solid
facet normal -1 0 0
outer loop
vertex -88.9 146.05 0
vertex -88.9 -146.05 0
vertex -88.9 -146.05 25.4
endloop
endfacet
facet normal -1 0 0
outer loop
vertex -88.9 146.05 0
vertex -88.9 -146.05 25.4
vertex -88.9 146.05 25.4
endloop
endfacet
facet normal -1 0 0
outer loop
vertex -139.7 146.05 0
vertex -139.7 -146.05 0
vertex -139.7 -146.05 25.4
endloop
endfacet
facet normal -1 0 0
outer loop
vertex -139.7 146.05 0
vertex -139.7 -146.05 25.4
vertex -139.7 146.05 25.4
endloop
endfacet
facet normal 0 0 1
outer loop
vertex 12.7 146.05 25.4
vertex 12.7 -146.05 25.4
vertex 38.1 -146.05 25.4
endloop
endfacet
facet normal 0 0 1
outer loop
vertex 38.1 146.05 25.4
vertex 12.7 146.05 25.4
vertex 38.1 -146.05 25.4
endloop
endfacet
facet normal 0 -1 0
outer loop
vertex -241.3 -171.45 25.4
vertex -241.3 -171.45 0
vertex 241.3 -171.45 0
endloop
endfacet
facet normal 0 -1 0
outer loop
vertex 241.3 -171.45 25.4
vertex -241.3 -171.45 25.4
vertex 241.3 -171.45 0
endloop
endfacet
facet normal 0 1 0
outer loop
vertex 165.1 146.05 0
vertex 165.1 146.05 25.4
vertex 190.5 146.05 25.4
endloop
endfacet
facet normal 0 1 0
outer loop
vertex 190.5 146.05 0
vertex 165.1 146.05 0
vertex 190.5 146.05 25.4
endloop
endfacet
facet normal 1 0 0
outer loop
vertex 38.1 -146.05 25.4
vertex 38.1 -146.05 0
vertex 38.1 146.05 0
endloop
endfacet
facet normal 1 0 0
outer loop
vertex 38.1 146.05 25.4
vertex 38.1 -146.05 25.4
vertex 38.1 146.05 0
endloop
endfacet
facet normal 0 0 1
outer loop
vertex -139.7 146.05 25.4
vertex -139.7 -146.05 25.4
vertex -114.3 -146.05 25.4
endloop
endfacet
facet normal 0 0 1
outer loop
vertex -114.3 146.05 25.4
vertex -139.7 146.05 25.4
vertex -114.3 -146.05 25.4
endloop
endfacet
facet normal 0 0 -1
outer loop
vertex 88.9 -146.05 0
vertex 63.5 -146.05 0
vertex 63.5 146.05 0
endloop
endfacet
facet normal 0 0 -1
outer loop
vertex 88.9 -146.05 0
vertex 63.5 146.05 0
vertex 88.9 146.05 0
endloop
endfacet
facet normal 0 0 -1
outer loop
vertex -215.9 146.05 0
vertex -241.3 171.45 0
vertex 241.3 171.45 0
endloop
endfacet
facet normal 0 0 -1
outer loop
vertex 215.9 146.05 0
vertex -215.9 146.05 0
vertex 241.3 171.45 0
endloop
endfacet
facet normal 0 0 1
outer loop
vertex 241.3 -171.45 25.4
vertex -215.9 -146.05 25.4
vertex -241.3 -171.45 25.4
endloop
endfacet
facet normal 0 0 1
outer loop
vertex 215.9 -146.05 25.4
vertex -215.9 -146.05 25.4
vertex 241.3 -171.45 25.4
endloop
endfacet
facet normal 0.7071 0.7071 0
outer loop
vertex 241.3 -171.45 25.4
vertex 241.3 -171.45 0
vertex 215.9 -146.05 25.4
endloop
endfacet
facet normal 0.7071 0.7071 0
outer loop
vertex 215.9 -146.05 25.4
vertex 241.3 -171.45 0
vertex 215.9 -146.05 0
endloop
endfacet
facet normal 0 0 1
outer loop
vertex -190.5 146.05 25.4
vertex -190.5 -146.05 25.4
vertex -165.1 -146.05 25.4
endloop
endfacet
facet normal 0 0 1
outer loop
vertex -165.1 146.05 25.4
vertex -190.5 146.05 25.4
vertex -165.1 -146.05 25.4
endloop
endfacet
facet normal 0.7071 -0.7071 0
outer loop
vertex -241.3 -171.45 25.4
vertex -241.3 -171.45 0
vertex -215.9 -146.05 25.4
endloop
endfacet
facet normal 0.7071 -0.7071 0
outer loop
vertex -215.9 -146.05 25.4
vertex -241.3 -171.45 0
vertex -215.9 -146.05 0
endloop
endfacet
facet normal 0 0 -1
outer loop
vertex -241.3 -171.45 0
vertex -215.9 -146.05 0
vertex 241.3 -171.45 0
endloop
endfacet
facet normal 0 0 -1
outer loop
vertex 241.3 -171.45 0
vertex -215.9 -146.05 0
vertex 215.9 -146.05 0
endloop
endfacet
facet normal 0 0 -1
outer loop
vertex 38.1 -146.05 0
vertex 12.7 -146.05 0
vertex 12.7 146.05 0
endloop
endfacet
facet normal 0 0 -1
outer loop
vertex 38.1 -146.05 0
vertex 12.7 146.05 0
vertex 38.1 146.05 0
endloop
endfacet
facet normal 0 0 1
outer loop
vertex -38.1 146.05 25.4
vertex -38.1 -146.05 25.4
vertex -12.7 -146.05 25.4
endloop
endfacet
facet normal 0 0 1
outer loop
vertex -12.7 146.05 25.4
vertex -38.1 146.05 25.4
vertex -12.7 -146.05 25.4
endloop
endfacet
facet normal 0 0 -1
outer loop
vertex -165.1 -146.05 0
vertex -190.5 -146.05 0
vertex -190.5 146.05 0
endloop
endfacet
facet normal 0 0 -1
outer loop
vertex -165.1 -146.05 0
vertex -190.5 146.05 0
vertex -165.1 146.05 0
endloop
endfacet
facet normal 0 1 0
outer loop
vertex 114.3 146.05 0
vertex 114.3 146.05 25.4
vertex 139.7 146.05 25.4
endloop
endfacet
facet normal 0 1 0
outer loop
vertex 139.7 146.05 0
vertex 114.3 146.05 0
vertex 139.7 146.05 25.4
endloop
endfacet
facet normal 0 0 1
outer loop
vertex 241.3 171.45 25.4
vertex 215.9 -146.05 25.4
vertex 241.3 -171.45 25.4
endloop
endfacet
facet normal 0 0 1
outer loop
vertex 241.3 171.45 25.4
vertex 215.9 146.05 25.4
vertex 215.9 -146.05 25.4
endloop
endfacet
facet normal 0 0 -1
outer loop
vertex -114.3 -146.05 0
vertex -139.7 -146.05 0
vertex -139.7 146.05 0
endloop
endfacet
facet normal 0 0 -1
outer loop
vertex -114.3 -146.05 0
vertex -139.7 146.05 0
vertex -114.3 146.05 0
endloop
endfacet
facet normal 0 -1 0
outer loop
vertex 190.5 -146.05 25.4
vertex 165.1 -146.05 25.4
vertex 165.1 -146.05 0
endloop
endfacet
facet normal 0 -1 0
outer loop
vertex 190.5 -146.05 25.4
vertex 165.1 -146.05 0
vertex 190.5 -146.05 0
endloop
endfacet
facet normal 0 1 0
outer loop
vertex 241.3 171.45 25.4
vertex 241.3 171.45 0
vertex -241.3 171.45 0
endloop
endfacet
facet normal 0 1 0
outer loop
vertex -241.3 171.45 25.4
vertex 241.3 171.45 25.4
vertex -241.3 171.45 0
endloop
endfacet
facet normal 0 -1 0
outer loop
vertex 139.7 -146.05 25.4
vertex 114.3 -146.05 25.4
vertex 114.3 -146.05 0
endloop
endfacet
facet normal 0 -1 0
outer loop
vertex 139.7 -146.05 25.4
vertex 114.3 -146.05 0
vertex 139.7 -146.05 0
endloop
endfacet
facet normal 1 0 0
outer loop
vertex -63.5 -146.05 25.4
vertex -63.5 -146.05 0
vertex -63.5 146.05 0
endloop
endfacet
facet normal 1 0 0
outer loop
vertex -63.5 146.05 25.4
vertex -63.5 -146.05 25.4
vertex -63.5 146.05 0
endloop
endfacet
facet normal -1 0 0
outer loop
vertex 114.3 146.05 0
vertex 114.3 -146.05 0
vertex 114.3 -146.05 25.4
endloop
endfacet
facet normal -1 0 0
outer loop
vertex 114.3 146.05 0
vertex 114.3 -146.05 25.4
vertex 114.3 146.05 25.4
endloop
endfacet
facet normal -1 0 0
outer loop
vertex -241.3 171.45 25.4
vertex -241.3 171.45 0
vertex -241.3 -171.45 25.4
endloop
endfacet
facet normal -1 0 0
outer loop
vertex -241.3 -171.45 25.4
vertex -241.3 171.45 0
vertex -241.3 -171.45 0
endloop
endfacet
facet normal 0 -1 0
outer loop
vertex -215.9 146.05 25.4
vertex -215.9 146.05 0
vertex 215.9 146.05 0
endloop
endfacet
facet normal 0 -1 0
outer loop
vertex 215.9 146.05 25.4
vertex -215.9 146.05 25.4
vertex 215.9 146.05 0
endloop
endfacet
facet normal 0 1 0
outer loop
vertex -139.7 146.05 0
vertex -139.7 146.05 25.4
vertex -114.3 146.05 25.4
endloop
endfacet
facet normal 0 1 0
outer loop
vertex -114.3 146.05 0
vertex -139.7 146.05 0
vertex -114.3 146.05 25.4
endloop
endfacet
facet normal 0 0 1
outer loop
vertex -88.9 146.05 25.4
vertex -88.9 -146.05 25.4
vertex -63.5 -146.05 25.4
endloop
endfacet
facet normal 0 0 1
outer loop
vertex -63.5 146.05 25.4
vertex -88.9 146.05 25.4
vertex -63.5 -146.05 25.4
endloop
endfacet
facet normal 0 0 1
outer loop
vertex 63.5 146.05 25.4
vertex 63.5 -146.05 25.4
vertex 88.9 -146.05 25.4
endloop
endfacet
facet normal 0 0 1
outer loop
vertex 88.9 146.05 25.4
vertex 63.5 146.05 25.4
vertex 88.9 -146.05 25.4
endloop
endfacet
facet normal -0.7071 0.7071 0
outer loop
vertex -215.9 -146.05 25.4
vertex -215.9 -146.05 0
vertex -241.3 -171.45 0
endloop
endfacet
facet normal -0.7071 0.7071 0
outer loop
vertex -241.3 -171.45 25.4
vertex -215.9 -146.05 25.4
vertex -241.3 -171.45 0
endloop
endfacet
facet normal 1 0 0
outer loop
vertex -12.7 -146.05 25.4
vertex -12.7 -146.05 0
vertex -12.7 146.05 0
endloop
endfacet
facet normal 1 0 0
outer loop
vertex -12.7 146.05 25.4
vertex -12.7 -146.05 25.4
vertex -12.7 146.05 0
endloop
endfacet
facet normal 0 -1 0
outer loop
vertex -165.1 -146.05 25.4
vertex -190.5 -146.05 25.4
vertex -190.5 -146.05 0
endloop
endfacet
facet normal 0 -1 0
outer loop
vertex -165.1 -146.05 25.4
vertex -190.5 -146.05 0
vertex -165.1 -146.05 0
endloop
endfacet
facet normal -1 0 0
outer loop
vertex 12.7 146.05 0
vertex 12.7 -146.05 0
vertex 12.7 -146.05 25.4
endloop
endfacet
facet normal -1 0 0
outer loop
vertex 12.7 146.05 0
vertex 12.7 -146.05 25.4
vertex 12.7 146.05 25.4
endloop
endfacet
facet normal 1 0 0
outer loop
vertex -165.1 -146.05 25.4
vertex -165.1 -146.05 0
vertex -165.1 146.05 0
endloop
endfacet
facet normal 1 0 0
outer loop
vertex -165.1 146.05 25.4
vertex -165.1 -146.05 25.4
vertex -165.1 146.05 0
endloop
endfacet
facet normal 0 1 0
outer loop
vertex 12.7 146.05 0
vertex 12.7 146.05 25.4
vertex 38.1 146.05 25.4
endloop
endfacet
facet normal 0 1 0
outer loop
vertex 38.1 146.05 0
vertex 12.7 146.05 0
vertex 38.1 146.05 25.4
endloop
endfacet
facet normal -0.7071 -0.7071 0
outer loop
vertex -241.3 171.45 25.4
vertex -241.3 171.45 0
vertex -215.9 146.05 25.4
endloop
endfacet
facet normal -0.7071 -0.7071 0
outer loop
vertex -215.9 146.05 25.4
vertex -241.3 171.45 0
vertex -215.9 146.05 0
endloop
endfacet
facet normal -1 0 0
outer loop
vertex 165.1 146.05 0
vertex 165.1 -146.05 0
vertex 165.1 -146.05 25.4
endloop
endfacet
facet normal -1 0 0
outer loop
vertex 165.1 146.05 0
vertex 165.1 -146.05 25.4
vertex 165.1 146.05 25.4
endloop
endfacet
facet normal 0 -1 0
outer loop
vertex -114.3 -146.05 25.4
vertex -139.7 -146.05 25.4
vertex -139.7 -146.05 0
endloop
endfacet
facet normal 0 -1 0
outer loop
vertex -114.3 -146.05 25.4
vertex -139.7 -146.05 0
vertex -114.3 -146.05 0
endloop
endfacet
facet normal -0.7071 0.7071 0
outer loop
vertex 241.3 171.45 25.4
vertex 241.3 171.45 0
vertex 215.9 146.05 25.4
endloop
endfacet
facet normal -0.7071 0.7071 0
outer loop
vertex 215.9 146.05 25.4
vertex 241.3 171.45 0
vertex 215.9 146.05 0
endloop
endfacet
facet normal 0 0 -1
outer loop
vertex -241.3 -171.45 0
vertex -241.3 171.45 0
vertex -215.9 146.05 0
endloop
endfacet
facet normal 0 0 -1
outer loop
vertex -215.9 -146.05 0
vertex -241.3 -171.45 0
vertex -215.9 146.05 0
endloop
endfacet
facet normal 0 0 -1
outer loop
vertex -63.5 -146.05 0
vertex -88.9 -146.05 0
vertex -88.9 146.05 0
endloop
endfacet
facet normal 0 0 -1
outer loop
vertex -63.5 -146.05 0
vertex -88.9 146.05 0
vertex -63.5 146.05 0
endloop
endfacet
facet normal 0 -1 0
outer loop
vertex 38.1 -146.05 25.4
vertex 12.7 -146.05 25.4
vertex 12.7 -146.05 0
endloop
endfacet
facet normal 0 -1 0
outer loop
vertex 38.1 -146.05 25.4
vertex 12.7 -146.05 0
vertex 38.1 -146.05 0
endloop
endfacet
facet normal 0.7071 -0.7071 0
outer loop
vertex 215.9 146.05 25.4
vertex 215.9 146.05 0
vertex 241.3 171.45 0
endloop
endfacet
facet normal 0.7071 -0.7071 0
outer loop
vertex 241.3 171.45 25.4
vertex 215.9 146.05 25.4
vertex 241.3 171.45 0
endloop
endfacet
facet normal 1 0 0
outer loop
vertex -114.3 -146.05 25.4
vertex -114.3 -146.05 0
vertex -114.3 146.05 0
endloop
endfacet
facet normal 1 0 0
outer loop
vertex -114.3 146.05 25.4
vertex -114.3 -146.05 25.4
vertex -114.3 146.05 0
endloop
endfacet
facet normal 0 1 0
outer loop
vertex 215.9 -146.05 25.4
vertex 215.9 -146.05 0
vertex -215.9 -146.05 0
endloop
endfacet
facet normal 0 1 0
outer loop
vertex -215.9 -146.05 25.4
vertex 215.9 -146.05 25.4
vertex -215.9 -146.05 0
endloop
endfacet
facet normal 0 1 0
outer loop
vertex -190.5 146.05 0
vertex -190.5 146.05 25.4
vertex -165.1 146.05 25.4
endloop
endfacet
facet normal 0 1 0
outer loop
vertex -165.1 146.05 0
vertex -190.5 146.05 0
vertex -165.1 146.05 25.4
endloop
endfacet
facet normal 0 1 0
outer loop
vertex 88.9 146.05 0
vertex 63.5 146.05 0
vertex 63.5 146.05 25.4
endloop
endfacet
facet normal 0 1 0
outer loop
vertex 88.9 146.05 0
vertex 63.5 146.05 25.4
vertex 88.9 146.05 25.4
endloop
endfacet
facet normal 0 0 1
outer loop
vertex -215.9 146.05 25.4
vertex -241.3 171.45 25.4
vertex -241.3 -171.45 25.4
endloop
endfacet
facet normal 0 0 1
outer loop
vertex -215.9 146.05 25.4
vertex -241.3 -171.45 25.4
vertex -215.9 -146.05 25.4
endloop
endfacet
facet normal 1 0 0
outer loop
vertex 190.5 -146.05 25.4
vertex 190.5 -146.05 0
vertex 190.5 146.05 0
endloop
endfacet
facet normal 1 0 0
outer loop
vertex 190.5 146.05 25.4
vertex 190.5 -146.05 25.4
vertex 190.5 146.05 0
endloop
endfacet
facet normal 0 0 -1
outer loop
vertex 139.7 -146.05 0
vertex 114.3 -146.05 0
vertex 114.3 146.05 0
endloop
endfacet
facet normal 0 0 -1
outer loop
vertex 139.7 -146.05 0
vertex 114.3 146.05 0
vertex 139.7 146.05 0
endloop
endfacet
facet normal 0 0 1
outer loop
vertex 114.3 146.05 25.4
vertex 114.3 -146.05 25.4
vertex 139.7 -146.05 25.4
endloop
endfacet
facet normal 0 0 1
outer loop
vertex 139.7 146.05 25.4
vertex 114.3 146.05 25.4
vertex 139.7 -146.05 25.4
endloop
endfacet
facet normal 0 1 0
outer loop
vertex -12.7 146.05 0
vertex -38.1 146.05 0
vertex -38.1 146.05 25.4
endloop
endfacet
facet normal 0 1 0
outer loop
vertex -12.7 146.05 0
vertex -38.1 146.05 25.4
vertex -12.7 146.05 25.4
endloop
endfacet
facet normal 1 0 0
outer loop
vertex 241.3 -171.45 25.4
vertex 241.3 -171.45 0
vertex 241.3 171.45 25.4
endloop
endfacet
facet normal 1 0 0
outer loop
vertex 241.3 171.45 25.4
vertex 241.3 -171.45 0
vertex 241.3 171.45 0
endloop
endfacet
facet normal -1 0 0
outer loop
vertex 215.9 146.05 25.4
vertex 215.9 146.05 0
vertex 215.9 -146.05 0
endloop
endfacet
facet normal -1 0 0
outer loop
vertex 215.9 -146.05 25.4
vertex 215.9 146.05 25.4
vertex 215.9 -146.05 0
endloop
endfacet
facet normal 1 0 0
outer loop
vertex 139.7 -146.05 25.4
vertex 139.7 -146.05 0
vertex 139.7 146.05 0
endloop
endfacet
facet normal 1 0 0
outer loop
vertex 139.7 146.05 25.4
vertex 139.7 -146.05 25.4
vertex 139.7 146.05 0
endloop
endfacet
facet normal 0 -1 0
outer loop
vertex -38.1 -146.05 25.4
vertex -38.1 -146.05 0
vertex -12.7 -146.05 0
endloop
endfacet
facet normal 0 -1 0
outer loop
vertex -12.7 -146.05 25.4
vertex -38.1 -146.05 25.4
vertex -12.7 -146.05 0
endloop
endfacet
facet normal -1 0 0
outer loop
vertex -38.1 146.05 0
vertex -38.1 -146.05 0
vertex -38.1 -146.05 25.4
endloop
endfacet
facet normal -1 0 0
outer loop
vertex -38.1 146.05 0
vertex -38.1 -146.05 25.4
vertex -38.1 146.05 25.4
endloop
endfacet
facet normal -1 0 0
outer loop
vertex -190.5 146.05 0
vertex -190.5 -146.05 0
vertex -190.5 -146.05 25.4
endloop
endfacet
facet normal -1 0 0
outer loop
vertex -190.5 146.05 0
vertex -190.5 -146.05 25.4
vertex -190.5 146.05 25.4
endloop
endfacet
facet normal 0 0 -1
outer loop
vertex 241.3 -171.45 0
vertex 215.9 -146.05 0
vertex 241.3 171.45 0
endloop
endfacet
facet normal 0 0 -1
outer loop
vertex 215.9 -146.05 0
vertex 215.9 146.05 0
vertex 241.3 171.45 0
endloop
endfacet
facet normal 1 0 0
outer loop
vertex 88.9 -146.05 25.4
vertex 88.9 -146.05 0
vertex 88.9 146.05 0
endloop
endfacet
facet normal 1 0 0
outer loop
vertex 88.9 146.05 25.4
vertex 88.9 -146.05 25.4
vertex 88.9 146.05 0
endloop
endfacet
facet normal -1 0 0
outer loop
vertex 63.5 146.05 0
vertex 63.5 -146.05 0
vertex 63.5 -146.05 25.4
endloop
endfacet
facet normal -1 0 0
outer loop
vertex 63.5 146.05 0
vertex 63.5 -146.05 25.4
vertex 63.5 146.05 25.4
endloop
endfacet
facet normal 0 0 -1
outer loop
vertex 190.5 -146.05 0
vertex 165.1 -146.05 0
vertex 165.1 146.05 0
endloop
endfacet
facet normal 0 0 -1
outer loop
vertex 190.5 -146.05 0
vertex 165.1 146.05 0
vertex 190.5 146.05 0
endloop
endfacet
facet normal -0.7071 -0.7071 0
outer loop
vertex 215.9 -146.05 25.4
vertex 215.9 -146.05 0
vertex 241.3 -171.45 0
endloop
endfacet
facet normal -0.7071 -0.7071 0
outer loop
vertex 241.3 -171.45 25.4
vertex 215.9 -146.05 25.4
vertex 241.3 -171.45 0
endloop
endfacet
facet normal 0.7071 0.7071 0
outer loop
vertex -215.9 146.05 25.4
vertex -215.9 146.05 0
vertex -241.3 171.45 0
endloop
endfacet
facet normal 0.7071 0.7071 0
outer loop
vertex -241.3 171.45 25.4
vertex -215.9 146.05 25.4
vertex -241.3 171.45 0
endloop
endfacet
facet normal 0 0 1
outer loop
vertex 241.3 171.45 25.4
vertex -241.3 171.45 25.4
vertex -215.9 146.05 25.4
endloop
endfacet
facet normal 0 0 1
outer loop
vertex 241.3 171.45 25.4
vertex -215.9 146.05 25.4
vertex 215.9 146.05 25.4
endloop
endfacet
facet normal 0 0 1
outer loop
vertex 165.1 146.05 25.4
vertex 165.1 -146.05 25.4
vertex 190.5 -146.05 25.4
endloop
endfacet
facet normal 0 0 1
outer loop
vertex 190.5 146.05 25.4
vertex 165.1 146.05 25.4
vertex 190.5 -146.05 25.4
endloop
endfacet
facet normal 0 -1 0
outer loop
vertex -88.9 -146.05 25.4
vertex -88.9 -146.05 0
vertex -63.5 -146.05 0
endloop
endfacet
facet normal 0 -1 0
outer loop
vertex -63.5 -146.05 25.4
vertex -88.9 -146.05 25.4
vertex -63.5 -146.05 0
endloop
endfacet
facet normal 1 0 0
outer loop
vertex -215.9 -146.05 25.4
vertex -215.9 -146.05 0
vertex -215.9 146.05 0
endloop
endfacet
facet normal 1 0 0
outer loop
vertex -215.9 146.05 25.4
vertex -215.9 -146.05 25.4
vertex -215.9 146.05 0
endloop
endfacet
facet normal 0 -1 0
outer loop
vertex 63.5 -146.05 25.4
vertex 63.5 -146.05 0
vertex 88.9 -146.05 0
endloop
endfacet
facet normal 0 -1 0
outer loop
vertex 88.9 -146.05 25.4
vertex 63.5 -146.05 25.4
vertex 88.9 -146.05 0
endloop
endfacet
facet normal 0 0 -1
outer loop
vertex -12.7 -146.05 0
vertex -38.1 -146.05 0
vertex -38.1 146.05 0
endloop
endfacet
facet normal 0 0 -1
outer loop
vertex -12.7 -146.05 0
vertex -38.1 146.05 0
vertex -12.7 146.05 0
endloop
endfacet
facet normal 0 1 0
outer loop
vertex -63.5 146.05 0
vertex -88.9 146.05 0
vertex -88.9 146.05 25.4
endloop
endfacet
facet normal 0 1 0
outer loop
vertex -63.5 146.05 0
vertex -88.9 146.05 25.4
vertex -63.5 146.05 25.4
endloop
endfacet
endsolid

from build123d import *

# Parameters (mm, degrees)
F1_DEPTH  = 25.4
F2_DEPTH  = 25.4
F3_DEPTH  = 25.4
F4_DEPTH  = 25.4
F5_W      = 25.4
F5_H      = 292.1
F6_DEPTH  = 25.4
F7_DEPTH  = 25.4
F8_DEPTH  = 25.4
F9_DEPTH  = 25.4
F10_DEPTH = 25.4
F11_DEPTH = 25.4
F12_DEPTH = 25.4
F13_DEPTH = 25.4


with BuildPart() as f1:
    # F0 (on Top) → F1 (new body)
    with BuildSketch(Plane.XY):
        Polygon((241.3, 171.45), (-241.3, 171.45), (-215.9, 146.05), (215.9, 146.05), align=None)
    extrude(amount=F1_DEPTH)


with BuildPart() as f2:
    # F0 (on Top) → F2 (new body)
    with BuildSketch(Plane.XY):
        Polygon((-241.3, 171.45), (-241.3, -171.45), (-215.9, -146.05), (-215.9, 146.05), align=None)
    extrude(amount=F2_DEPTH)


with BuildPart() as f3:
    # F0 (on Top) → F3 (new body)
    with BuildSketch(Plane.XY):
        Polygon((-215.9, -146.05), (-241.3, -171.45), (241.3, -171.45), (215.9, -146.05), align=None)
    extrude(amount=F3_DEPTH)


with BuildPart() as f4:
    # F0 (on Top) → F4 (new body)
    with BuildSketch(Plane.XY):
        Polygon((215.9, -146.05), (241.3, -171.45), (241.3, 171.45), (215.9, 146.05), align=None)
    extrude(amount=F4_DEPTH)


with BuildPart() as f6:
    # F5 (on Top) → F6 (new body)
    with BuildSketch(Plane.XY):
        with Locations((-177.8, 0)):
            Rectangle(F5_W, F5_H)
    extrude(amount=F6_DEPTH)


with BuildPart() as f7:
    # F5 (on Top) → F7 (new body)
    with BuildSketch(Plane.XY):
        with Locations((-127, 0)):
            Rectangle(F5_W, F5_H)
    extrude(amount=F7_DEPTH)


with BuildPart() as f8:
    # F5 (on Top) → F8 (new body)
    with BuildSketch(Plane.XY):
        with Locations((-76.2, 0)):
            Rectangle(F5_W, F5_H)
    extrude(amount=F8_DEPTH)


with BuildPart() as f9:
    # F5 (on Top) → F9 (new body)
    with BuildSketch(Plane.XY):
        with Locations((-25.4, 0)):
            Rectangle(F5_W, F5_H)
    extrude(amount=F9_DEPTH)


with BuildPart() as f10:
    # F5 (on Top) → F10 (new body)
    with BuildSketch(Plane.XY):
        with Locations((25.4, 0)):
            Rectangle(F5_W, F5_H)
    extrude(amount=F10_DEPTH)


with BuildPart() as f11:
    # F5 (on Top) → F11 (new body)
    with BuildSketch(Plane.XY):
        with Locations((76.2, 0)):
            Rectangle(F5_W, F5_H)
    extrude(amount=F11_DEPTH)


with BuildPart() as f12:
    # F5 (on Top) → F12 (new body)
    with BuildSketch(Plane.XY):
        with Locations((127, 0)):
            Rectangle(F5_W, F5_H)
    extrude(amount=F12_DEPTH)


with BuildPart() as f13:
    # F5 (on Top) → F13 (new body)
    with BuildSketch(Plane.XY):
        with Locations((177.8, 0)):
            Rectangle(F5_W, F5_H)
    extrude(amount=F13_DEPTH)


solid = Compound([f1.part, f2.part, f3.part, f4.part, f6.part, f7.part, f8.part, f9.part, f10.part, f11.part, f12.part, f13.part])
